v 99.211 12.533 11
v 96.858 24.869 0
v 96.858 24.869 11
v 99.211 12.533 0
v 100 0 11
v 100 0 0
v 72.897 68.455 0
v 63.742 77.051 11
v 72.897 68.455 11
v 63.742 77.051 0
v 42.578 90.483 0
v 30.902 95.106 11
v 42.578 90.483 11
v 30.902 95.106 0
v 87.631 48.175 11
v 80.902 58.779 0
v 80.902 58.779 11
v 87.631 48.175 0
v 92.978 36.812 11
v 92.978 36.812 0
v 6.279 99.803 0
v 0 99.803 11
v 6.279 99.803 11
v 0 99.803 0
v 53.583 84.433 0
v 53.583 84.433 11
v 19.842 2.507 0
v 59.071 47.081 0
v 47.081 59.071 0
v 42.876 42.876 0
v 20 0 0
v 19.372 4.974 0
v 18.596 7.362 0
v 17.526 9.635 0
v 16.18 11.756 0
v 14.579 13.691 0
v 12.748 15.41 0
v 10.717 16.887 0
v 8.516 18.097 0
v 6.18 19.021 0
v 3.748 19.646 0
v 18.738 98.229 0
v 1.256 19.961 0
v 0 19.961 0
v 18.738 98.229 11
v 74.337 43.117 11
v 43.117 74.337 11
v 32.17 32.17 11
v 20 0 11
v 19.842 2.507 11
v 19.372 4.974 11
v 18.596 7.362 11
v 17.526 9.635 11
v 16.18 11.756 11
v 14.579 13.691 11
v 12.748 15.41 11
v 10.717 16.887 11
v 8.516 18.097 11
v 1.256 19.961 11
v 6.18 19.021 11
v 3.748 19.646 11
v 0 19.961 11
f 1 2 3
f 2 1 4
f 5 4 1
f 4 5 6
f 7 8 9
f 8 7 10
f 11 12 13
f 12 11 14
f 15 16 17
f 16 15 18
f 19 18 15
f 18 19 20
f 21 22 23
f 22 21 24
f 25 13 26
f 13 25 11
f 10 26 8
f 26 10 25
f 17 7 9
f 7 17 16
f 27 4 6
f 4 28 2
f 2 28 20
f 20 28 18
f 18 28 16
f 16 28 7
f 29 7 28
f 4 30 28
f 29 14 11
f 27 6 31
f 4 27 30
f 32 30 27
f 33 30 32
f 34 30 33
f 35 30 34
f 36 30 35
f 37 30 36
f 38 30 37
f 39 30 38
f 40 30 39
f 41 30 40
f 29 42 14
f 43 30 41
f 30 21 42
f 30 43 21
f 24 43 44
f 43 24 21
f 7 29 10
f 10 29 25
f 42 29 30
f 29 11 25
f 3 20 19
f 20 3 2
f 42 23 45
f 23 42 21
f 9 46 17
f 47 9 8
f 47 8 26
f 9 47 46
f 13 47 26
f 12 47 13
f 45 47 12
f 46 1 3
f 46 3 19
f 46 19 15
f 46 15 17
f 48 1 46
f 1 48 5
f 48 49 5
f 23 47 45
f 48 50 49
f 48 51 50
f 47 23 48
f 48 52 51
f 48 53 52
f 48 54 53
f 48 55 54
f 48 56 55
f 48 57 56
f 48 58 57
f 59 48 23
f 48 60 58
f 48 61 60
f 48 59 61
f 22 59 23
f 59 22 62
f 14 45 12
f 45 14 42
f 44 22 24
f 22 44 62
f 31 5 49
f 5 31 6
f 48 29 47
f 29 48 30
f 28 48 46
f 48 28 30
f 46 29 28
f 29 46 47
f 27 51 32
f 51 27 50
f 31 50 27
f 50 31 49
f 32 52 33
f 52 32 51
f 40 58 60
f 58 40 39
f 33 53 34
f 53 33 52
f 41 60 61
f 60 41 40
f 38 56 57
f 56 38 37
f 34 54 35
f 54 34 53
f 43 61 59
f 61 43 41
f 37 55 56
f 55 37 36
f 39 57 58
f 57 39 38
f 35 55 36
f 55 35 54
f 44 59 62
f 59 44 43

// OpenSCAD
//How big? (mm)
radius = 100;

//How tall? (mm)
height = 11;

//If you would like a cutout in the corner in case of a moulding, set to not zero
cornercut_radius = 20; //[0:5:40]

//What is the size of your cube? 57 is standard(mm)
cube_size = 57;

//How deep should your cube rest? Recommended is a little more than a third your cube size. (mm)
depth = 20;//[1:30]

//Would you like to preview how your cube will sit?
preview_cube = "false"; // [true:yes, false:no]


//option to preview the cube's location
if (preview_cube == "true"){
    translate([radius/2,radius/2,cube_size - depth +1])
        rotate([45,36,45]) 
        cube(cube_size, center=true);
}

    
difference(){
    
    //main body
    $fn = 50;
    cylinder(h=height, r=radius );
    
    //cut the cylinder into a quarter cylinder
    translate([-radius,0,0]) cube(2*radius, center=true);
    translate([0,-radius,0]) cube(2*radius, center=true);
    
    //cutout for the cube
    translate([radius/2,radius/2,cube_size - depth + (height/2)])
        rotate([45,36,45]) 
        cube(cube_size, center=true);
    
    //cutout for a moulding
    translate([0,0,-1]) cylinder(h=height +2 , r=cornercut_radius);
    
}
